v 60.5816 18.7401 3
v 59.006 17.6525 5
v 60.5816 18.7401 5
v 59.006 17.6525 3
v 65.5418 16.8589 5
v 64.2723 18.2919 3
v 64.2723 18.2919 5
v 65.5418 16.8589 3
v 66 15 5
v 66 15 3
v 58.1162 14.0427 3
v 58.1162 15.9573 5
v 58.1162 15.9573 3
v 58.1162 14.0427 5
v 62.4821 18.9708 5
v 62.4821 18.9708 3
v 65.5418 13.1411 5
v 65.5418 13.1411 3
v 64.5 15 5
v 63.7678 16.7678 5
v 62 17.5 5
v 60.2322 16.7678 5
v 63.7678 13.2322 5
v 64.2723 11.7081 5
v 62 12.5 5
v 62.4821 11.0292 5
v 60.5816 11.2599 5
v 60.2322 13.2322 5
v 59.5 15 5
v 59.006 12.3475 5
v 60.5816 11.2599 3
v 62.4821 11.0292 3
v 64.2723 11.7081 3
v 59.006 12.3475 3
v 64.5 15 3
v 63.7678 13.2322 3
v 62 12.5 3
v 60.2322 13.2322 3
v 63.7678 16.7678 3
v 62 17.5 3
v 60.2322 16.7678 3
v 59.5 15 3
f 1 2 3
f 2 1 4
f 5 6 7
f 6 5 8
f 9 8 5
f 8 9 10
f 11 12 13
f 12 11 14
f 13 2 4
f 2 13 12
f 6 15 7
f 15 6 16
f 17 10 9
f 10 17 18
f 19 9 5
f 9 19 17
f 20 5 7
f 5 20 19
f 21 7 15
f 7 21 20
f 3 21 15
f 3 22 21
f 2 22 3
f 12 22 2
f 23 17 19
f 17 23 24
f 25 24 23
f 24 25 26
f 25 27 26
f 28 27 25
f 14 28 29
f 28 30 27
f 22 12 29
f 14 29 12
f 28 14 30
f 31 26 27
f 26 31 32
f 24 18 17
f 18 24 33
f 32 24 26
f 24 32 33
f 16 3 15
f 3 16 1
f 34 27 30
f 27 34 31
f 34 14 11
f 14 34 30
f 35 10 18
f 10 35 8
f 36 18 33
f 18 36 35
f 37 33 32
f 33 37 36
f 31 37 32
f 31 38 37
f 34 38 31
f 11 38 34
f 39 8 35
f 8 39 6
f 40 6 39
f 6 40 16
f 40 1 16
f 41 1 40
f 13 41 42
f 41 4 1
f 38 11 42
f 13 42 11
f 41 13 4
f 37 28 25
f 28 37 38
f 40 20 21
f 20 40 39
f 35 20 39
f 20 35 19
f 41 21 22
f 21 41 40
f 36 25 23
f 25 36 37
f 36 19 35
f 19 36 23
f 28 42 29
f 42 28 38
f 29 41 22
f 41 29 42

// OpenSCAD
//cube(20,center = true); 

base_height=3;
image_height=2;

difference() {
union() {
scale([0.5,0.5,1])
 union() {
translate([0,0,3]) 
linear_extrude(height=image_height)import(file="sfd_keyring_image.dxf");
//linear_extrude(file="sfd_keyring_image.dxf",height=image_height);
linear_extrude(height=base_height)import(file="sfd_keyring_base.dxf");
//linear_extrude(file="sfd_keyring_base.dxf",height=base_height);

}
translate([62,15,base_height])  cylinder (h = image_height, r=4);
}
translate([62,15,-0.5])  cylinder (h = base_height+image_height+1, r=2.5);

 }
